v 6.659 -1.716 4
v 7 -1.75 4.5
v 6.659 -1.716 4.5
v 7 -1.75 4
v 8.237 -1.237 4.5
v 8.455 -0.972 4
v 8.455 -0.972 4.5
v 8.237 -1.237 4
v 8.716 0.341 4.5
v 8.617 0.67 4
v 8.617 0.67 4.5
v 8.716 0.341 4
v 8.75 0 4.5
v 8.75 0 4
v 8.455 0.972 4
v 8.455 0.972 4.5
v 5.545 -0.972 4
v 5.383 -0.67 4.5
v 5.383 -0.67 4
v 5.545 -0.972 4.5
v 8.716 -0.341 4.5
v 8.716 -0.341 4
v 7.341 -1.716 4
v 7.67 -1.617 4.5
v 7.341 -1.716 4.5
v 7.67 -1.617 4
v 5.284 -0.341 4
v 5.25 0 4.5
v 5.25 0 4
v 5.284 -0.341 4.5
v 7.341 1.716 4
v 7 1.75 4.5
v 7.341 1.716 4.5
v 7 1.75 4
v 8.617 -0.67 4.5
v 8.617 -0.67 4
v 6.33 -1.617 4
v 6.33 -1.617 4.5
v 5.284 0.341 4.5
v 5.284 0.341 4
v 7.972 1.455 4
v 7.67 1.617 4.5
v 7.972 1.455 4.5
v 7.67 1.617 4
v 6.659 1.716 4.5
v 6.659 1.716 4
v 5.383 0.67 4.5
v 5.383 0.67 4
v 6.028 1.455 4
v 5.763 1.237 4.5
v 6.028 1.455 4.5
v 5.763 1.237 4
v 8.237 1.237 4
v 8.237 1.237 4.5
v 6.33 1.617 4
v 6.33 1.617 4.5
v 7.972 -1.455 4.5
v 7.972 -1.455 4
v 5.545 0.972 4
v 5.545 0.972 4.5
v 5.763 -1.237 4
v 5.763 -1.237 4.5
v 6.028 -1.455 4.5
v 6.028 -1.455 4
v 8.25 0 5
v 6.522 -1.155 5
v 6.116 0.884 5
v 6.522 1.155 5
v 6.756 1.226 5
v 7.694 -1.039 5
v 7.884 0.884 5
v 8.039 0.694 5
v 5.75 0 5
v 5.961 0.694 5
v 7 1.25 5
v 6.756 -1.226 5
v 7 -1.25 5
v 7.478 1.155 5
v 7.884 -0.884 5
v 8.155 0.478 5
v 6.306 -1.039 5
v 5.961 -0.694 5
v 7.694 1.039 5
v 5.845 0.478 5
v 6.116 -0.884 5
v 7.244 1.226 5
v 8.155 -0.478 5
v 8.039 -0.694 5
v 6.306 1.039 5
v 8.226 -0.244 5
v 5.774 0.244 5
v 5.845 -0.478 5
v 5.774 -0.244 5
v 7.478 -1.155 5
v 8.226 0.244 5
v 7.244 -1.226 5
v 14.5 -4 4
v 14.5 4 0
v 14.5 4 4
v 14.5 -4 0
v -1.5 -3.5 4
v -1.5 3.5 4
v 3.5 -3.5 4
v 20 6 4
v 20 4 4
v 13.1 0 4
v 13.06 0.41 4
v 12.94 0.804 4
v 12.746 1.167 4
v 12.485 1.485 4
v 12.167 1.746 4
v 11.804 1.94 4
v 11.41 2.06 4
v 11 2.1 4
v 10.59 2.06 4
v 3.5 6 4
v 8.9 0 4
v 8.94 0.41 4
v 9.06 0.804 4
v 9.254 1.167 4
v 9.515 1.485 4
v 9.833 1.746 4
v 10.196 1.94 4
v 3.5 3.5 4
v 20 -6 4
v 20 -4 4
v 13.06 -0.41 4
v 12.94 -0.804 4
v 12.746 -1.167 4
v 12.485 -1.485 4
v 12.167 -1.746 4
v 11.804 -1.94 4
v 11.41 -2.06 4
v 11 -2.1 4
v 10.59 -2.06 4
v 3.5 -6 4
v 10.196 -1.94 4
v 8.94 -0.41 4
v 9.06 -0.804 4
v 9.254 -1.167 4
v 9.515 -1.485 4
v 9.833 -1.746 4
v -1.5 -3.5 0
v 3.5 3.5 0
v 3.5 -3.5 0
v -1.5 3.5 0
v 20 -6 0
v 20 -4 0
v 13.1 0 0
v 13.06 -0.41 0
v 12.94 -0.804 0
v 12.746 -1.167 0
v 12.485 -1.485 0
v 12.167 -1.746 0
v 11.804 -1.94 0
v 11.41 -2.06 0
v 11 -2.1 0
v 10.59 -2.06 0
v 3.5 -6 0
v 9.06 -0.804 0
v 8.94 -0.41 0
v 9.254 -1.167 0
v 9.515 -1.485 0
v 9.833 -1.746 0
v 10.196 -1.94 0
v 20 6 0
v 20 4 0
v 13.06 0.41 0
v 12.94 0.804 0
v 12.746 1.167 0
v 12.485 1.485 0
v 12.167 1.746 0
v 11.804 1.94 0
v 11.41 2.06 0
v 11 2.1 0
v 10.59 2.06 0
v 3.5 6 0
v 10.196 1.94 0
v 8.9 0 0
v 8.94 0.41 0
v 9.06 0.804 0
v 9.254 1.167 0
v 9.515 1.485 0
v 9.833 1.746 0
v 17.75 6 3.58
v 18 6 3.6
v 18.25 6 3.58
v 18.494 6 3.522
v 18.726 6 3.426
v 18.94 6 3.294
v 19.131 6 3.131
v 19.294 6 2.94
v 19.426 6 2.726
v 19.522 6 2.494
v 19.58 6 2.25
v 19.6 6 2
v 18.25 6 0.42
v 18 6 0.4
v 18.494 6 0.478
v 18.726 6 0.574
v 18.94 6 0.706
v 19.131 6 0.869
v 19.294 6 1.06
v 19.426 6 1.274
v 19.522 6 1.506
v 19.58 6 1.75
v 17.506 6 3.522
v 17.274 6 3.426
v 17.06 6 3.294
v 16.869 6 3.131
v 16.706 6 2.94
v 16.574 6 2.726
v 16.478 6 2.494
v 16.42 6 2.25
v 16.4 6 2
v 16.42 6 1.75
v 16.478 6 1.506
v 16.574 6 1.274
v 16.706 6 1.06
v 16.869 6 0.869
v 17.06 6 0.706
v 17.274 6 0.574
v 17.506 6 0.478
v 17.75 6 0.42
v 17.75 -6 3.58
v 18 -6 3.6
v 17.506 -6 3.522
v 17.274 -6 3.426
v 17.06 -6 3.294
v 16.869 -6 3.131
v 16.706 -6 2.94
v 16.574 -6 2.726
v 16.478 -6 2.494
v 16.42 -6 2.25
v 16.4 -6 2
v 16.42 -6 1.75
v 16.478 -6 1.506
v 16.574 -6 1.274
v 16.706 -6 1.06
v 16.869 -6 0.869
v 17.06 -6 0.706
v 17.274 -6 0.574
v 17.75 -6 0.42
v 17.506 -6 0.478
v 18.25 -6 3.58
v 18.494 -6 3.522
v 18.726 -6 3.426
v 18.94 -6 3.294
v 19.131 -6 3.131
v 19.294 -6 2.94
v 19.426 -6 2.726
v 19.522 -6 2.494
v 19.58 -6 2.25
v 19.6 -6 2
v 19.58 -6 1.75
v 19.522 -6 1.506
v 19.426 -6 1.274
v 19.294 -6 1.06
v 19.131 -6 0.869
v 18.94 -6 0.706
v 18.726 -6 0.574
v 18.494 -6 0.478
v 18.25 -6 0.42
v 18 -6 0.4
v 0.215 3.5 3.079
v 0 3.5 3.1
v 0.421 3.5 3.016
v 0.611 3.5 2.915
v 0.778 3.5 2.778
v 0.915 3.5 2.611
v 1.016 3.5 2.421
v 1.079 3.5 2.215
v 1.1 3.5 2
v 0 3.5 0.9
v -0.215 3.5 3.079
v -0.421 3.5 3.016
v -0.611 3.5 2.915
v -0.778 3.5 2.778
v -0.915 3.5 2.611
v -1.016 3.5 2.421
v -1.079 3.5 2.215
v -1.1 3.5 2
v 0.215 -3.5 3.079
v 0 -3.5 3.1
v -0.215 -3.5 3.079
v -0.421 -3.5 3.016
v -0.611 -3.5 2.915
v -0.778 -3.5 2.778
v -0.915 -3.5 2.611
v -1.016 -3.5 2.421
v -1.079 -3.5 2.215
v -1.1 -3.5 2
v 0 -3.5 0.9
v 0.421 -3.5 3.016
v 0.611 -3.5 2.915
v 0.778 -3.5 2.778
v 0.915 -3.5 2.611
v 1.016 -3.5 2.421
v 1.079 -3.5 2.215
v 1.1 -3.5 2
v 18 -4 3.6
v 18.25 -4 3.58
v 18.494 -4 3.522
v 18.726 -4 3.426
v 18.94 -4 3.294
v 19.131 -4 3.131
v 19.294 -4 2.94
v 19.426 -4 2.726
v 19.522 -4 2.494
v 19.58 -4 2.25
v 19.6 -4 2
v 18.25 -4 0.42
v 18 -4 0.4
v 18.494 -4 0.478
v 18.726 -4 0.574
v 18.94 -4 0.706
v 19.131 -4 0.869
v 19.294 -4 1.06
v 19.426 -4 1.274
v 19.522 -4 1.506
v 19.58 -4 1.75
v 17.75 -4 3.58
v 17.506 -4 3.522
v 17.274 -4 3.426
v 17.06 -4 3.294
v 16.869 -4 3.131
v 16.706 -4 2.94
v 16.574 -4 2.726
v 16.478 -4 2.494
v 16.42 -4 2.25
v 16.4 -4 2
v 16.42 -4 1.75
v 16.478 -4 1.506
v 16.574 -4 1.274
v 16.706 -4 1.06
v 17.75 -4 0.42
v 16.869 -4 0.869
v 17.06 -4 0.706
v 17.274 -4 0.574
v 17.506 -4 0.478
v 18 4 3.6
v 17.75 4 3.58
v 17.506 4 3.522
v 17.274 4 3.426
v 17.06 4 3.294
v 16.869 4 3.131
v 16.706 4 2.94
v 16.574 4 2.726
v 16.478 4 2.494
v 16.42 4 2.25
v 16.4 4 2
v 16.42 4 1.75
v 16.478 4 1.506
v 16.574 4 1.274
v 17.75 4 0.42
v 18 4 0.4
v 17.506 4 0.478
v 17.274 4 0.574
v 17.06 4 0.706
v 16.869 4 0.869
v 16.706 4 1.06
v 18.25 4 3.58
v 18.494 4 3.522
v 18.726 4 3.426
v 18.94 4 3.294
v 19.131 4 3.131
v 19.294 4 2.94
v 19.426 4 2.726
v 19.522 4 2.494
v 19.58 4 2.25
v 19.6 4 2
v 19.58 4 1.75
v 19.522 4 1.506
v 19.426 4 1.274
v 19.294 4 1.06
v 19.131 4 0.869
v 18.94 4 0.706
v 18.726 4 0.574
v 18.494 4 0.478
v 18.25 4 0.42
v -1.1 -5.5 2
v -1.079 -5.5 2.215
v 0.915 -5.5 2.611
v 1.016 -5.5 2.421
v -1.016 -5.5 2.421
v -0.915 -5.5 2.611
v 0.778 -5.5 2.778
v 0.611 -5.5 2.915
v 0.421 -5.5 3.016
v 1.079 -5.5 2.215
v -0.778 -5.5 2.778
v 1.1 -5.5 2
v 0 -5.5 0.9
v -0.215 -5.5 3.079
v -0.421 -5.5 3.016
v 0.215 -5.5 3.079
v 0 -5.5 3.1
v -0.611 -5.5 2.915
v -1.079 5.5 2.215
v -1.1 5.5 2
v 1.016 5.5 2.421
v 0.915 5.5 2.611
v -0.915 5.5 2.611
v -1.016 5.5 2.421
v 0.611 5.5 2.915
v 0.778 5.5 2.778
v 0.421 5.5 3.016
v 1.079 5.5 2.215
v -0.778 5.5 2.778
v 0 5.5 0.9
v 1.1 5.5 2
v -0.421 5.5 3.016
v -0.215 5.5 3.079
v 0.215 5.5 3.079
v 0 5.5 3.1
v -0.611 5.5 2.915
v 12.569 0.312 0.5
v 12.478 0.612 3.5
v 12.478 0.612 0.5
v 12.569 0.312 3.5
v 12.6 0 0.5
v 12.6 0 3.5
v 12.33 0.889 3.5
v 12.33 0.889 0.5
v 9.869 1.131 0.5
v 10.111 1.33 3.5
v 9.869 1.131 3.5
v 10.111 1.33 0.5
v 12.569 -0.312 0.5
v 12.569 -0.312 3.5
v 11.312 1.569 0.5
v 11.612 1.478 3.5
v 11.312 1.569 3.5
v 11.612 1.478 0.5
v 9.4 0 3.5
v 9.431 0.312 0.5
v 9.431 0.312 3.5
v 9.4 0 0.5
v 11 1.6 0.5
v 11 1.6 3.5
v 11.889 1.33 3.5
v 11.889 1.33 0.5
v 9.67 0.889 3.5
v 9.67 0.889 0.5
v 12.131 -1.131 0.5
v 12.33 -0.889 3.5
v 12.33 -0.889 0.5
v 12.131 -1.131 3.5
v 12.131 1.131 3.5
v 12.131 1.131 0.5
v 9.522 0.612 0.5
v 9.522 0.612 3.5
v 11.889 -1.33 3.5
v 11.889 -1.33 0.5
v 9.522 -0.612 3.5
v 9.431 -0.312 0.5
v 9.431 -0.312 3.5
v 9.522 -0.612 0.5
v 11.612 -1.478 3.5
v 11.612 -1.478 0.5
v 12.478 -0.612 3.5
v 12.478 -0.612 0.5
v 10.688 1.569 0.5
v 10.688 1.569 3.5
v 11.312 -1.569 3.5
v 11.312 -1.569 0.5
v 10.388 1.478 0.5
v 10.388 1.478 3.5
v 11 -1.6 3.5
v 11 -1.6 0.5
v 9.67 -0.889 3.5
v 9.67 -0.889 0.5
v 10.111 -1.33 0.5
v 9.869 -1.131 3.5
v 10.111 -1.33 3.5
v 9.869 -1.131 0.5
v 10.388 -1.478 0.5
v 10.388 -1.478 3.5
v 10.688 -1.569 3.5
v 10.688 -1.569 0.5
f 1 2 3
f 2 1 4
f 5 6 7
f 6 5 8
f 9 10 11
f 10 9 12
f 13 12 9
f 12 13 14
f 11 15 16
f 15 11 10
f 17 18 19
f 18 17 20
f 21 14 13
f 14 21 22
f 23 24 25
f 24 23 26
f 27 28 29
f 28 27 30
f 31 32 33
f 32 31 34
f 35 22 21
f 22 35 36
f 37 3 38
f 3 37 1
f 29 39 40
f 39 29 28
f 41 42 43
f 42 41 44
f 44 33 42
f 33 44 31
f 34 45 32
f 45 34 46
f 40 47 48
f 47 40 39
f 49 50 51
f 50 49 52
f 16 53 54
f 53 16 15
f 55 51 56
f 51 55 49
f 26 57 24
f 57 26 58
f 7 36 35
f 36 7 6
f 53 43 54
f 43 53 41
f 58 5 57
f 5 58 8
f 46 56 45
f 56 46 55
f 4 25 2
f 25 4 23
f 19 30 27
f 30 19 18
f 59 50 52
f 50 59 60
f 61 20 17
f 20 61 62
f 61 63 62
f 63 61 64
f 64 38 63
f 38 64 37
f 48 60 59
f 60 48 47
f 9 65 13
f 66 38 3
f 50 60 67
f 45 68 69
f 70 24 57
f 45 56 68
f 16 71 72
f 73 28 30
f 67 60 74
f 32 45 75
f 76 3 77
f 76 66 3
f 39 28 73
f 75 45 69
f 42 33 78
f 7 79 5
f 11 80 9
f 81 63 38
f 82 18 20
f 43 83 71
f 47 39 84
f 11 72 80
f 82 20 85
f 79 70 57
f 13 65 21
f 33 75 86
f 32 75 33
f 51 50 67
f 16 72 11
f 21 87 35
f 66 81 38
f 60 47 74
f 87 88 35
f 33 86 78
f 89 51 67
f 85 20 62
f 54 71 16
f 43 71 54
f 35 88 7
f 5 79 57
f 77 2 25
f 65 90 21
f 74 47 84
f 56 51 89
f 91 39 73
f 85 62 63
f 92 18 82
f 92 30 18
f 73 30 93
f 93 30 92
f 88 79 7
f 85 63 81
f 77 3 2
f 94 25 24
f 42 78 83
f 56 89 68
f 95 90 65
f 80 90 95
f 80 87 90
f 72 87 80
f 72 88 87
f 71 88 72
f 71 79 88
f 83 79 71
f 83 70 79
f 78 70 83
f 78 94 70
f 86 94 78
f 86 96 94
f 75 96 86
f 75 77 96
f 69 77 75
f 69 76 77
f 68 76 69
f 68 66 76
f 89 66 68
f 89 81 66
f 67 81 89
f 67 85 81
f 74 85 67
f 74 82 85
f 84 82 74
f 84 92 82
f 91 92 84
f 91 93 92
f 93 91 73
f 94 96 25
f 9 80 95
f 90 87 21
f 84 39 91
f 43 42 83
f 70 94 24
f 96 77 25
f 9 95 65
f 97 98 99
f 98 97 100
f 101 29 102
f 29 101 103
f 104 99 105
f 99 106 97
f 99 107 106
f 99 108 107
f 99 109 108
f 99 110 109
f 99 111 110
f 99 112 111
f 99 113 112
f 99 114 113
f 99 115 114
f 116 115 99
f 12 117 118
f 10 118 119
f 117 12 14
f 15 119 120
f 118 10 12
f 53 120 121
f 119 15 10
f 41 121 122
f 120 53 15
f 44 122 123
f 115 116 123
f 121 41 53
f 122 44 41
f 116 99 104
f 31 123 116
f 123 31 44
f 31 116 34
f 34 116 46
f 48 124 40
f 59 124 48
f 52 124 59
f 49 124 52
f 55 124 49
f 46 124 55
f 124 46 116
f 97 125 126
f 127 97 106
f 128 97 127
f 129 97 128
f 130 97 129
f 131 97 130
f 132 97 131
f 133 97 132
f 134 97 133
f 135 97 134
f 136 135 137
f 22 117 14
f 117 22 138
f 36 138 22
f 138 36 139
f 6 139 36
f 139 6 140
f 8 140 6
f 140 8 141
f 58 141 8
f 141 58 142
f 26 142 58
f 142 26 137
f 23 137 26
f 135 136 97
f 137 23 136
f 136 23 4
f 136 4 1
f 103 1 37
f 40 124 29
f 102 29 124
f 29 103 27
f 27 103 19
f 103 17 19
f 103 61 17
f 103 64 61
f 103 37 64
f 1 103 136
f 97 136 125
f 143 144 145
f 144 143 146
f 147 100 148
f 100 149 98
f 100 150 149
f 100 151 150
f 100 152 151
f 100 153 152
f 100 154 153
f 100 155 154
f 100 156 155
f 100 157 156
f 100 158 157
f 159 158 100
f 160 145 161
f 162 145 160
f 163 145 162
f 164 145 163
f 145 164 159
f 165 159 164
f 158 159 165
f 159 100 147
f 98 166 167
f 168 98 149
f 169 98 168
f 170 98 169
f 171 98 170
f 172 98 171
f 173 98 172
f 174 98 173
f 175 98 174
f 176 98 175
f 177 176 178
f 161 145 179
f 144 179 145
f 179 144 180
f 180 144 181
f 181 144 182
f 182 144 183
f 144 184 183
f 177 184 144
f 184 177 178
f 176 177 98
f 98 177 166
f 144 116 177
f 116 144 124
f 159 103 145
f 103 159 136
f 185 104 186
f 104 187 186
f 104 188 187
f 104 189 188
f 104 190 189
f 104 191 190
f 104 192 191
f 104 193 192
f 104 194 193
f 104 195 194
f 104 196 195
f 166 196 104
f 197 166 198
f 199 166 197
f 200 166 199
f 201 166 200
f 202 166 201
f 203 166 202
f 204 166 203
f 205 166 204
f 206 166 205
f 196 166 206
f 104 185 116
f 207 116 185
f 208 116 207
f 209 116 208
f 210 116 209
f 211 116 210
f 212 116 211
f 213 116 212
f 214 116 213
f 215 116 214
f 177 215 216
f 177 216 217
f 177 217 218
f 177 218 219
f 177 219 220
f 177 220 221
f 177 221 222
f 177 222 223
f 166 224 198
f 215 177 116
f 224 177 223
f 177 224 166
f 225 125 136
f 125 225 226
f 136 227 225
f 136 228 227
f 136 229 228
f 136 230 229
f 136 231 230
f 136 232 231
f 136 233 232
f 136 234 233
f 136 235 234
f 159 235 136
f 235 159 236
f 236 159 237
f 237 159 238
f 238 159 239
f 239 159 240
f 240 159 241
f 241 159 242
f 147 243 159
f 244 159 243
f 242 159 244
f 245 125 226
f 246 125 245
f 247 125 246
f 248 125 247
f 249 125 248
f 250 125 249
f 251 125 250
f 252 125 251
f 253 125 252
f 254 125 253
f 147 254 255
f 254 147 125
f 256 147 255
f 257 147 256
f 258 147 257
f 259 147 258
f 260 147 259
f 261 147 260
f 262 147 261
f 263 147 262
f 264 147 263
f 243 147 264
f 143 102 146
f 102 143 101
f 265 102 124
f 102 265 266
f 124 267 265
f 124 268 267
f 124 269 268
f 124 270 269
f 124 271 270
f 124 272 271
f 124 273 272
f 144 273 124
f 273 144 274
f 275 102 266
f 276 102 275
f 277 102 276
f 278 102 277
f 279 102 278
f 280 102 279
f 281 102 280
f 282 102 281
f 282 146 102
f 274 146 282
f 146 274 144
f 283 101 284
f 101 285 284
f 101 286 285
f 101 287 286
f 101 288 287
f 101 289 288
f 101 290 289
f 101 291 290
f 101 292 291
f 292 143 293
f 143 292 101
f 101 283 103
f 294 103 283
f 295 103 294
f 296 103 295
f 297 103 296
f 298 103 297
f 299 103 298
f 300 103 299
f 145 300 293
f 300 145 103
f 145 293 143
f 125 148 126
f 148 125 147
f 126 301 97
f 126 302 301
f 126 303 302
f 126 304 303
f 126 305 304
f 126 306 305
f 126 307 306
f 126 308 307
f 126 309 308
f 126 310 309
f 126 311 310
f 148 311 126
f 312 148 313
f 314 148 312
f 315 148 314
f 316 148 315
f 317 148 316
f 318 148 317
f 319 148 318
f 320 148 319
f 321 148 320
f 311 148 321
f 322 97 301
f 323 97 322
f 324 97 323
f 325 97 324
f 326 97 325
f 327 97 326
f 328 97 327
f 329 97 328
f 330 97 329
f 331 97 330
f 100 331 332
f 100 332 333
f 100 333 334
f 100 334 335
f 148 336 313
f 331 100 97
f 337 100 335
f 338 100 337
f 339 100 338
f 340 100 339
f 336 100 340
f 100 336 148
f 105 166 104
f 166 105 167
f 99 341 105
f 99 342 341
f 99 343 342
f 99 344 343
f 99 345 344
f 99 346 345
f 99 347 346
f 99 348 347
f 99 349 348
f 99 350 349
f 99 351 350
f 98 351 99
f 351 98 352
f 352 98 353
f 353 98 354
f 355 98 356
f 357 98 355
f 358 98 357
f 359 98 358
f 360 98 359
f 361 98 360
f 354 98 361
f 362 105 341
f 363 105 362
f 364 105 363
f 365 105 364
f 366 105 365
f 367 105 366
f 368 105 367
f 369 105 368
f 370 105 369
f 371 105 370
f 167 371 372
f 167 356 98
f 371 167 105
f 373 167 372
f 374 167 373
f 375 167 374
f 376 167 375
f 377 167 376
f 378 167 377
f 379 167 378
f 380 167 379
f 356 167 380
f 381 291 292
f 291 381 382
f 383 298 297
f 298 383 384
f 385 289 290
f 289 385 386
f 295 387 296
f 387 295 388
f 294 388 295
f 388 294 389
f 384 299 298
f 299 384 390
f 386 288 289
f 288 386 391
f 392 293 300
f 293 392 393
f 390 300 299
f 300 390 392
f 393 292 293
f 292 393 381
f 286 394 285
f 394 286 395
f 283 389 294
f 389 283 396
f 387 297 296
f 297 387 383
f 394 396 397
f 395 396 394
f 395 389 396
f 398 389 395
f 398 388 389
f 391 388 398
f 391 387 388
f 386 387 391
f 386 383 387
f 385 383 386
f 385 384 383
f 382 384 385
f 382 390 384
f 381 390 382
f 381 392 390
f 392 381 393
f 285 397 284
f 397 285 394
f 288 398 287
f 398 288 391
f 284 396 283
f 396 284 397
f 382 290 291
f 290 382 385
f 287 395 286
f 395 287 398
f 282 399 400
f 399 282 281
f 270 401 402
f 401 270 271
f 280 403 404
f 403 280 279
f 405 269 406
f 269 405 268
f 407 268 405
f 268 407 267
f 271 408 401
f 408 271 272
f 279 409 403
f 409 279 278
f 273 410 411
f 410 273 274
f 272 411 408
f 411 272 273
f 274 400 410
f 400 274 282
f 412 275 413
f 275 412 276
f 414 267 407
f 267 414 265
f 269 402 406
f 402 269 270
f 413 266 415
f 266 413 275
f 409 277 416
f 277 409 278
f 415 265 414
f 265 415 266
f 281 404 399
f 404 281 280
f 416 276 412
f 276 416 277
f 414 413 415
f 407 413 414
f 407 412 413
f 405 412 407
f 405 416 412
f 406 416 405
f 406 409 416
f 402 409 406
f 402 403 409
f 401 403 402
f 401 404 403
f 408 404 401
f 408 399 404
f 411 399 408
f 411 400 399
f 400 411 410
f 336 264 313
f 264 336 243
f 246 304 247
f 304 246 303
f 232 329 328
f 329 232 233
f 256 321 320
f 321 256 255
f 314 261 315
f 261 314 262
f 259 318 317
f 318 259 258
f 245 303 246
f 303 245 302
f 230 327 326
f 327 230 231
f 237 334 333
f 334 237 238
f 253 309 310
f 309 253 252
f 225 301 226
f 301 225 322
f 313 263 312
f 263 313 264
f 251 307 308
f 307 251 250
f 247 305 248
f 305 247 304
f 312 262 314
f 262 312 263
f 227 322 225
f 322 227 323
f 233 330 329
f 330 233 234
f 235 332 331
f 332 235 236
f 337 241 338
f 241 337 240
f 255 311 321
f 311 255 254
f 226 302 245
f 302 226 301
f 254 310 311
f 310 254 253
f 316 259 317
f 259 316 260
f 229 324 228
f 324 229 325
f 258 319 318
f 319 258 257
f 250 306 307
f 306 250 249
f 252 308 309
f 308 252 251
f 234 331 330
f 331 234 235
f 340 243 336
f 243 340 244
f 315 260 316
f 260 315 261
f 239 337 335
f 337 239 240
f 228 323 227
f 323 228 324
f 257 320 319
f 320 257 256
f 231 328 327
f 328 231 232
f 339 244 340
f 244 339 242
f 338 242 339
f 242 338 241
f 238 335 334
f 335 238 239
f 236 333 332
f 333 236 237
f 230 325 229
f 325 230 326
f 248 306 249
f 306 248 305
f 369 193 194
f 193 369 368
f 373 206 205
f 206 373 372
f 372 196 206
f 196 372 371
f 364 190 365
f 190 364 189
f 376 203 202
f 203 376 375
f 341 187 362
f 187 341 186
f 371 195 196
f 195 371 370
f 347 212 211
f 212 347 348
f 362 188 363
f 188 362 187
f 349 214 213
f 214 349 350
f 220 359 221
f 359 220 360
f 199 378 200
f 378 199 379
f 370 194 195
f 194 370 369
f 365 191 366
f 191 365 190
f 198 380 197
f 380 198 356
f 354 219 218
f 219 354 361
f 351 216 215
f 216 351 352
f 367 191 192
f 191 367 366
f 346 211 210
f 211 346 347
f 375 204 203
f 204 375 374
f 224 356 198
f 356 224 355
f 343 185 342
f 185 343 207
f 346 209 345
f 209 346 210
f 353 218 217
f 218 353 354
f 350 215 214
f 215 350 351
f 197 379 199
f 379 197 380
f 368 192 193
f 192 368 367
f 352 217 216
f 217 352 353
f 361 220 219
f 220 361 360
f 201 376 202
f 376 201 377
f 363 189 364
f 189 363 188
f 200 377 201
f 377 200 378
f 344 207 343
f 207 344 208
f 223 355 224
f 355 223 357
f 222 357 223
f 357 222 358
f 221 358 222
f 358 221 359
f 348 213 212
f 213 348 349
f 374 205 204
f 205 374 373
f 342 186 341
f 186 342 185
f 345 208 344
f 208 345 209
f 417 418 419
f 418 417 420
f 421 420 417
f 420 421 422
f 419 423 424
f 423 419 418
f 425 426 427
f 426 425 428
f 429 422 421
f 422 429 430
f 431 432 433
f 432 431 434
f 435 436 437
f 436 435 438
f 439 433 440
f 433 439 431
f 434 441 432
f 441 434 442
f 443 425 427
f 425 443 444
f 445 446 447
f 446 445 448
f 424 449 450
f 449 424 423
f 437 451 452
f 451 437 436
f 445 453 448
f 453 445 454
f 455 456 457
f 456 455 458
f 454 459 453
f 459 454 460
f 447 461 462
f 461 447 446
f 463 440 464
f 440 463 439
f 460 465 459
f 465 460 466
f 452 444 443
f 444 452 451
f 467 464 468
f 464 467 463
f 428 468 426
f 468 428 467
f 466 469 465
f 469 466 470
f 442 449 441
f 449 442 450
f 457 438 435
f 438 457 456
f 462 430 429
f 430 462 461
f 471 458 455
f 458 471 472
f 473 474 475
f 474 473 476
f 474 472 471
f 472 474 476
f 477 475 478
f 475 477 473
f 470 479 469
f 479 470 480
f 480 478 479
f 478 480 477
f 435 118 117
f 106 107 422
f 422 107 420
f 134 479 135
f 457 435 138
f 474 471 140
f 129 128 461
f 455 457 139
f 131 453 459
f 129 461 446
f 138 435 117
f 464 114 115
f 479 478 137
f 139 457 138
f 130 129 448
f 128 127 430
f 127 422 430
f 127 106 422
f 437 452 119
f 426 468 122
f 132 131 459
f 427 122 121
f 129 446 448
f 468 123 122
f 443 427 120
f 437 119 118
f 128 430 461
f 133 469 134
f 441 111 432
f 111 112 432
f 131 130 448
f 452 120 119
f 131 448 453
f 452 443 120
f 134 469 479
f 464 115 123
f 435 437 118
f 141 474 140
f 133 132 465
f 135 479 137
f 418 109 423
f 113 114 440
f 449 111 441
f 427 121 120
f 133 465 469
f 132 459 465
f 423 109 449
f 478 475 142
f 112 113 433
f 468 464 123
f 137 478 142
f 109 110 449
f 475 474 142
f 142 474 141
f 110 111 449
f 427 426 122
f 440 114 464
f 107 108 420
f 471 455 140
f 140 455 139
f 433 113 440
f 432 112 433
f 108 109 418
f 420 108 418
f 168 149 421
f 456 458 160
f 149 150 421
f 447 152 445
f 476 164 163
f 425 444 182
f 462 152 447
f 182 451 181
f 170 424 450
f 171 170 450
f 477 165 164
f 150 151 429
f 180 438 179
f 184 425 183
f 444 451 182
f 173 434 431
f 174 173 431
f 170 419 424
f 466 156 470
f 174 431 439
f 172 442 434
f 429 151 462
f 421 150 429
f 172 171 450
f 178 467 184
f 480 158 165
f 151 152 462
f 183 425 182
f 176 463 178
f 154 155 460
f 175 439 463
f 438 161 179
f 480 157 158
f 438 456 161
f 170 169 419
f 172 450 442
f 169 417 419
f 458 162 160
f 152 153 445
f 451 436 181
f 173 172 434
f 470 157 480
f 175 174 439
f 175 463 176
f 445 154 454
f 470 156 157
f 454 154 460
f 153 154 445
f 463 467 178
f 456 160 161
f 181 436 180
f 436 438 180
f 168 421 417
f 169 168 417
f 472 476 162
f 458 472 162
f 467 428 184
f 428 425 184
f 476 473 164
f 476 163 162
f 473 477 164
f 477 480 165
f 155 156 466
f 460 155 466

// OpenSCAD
// Bracelet of hinged links, printed in place
part = "link";
cadverify_only = "";
module instance(name, part, unit = 1) {
    echo(cadverify_instance = [name, part, unit]);
    if (cadverify_only == "" || cadverify_only == name) children();
}
P = 18; W = 12; Zc = 2.0;
Rp = 1.1; Rh = 1.6;
Ytong = 3.5;
Xrear = -1.5; Xsr = 3.5; Xsf = 14.5; Xlr = 13.5; Xfront = 20;
XpinF = 18;
studX = 7; studR = 1.75;
holeX = 11; holeR = 1.6;
module teardrop2D() {
    pts = concat([for (a=[0:180/16:180]) [Rp*cos(a), Zc+Rp*sin(a)]], [[0, Zc-Rp]]);
    polygon(pts);
}
module pin_stub(len) { linear_extrude(height=len) teardrop2D(); }
module stud_solid() {
    translate([studX, 0, 3.9]) cylinder(r=studR, h=0.6, $fn=32);
    translate([studX, 0, 4.5]) cylinder(r1=studR, r2=1.25, h=0.5, $fn=32);
}
module link() {
    difference() {
        union() {
            translate([Xsr, -6, 0]) cube([Xsf-Xsr, 12, 4]);
            translate([Xrear, -Ytong, 0]) cube([(4.5-Xrear), 7, 4]);
            translate([Xlr, -6, 0]) cube([Xfront-Xlr, 2, 4]);
            translate([Xlr, 4, 0]) cube([Xfront-Xlr, 2, 4]);
            translate([0, -2.5, 0]) rotate([90,0,0]) pin_stub(3.0);
            translate([0, 5.5, 0]) rotate([90,0,0]) pin_stub(3.0);
            stud_solid();
        }
        translate([XpinF, -6.1, Zc]) rotate([-90,0,0]) cylinder(r=Rh, h=2.2, $fn=40);
        translate([XpinF, 3.9, Zc]) rotate([-90,0,0]) cylinder(r=Rh, h=2.2, $fn=40);
        translate([holeX, 0, -0.1]) cylinder(r=holeR, h=4.2, $fn=32);
        translate([holeX, 0, 3.5]) cylinder(r1=holeR, r2=2.1, h=0.5, $fn=32);
        translate([holeX, 0, 0]) cylinder(r1=2.1, r2=holeR, h=0.5, $fn=32);
    }
}
if (part == "assembly") {
    echo(cadverify_spec = [
        ["bounds", [[-1.5, -6, 0], [56, 6, 5]]],
        ["support_faces", [["bed", "-z", 300]]],
        ["allowed_interferences", []],
        ["motions", [["joint_bend", ["link3"], "rotate", [36, 0, 2], [0, 1, 0], [-30, 30]]]],
        ["assembly_order", [[["link1"], [0, 0, 0]], [["link2"], [0, 0, -1]], [["link3"], [0, 0, -1]]]],
        ["print_in_place", 0.5],
        ["overhangs_allowed", [
            ["hole top bridge 3.2mm", [[16.4, 4, 3.0], [19.6, 6, 4]]],
            ["hole top bridge 3.2mm", [[16.4, -6, 3.0], [19.6, -4, 4]]],
            ["hole top bridge 3.2mm", [[34.4, 4, 3.0], [37.6, 6, 4]]],
            ["hole top bridge 3.2mm", [[34.4, -6, 3.0], [37.6, -4, 4]]],
            ["hole top bridge 3.2mm", [[52.4, 4, 3.0], [55.6, 6, 4]]],
            ["hole top bridge 3.2mm", [[52.4, -6, 3.0], [55.6, -4, 4]]]
        ]]
    ]);
    instance("link1", "link", 1) translate([0, 0, 0]) link();
    instance("link2", "link", 1) translate([18, 0, 0]) link();
    instance("link3", "link", 1) translate([36, 0, 0]) link();
} else {
    echo(cadverify_spec = [
        ["bounds", [[-1.5, -6, 0], [20, 6, 5]]],
        ["bodies", 1],
        ["through_holes", 3],
        ["support_faces", [["bed", "-z", 100]]],
        ["overhangs_allowed", [
            ["hole top bridge 3.2mm", [[16.4, 4, 3.0], [19.6, 6, 4]]],
            ["hole top bridge 3.2mm", [[16.4, -6, 3.0], [19.6, -4, 4]]]
        ]],
        ["copies", 3],
        ["details", [
            ["spine", "material", [[5, -5, 0], [9, 5, 4]], 0.9],
            ["slot", "void", [[14.5, -4, 0], [20, 4, 4]], 0.9],
            ["pin_hole", "hole", [18, -8, 2], [0, 1, 0], [[0, 3.2], [2, 3.2]]],
            ["snap_hole", "hole", [11, 0, 6], [0, 0, -1], [[0, 4.2], [0.5, 3.2], [3.5, 3.2], [4, 4.2]]],
            ["floor", "thickness", [9, 3, -1], [0, 0, 1], 4],
            ["snap", "view", [[5, -2, 4], [9, 2, 5]]]
        ]]
    ]);
    link();
}
